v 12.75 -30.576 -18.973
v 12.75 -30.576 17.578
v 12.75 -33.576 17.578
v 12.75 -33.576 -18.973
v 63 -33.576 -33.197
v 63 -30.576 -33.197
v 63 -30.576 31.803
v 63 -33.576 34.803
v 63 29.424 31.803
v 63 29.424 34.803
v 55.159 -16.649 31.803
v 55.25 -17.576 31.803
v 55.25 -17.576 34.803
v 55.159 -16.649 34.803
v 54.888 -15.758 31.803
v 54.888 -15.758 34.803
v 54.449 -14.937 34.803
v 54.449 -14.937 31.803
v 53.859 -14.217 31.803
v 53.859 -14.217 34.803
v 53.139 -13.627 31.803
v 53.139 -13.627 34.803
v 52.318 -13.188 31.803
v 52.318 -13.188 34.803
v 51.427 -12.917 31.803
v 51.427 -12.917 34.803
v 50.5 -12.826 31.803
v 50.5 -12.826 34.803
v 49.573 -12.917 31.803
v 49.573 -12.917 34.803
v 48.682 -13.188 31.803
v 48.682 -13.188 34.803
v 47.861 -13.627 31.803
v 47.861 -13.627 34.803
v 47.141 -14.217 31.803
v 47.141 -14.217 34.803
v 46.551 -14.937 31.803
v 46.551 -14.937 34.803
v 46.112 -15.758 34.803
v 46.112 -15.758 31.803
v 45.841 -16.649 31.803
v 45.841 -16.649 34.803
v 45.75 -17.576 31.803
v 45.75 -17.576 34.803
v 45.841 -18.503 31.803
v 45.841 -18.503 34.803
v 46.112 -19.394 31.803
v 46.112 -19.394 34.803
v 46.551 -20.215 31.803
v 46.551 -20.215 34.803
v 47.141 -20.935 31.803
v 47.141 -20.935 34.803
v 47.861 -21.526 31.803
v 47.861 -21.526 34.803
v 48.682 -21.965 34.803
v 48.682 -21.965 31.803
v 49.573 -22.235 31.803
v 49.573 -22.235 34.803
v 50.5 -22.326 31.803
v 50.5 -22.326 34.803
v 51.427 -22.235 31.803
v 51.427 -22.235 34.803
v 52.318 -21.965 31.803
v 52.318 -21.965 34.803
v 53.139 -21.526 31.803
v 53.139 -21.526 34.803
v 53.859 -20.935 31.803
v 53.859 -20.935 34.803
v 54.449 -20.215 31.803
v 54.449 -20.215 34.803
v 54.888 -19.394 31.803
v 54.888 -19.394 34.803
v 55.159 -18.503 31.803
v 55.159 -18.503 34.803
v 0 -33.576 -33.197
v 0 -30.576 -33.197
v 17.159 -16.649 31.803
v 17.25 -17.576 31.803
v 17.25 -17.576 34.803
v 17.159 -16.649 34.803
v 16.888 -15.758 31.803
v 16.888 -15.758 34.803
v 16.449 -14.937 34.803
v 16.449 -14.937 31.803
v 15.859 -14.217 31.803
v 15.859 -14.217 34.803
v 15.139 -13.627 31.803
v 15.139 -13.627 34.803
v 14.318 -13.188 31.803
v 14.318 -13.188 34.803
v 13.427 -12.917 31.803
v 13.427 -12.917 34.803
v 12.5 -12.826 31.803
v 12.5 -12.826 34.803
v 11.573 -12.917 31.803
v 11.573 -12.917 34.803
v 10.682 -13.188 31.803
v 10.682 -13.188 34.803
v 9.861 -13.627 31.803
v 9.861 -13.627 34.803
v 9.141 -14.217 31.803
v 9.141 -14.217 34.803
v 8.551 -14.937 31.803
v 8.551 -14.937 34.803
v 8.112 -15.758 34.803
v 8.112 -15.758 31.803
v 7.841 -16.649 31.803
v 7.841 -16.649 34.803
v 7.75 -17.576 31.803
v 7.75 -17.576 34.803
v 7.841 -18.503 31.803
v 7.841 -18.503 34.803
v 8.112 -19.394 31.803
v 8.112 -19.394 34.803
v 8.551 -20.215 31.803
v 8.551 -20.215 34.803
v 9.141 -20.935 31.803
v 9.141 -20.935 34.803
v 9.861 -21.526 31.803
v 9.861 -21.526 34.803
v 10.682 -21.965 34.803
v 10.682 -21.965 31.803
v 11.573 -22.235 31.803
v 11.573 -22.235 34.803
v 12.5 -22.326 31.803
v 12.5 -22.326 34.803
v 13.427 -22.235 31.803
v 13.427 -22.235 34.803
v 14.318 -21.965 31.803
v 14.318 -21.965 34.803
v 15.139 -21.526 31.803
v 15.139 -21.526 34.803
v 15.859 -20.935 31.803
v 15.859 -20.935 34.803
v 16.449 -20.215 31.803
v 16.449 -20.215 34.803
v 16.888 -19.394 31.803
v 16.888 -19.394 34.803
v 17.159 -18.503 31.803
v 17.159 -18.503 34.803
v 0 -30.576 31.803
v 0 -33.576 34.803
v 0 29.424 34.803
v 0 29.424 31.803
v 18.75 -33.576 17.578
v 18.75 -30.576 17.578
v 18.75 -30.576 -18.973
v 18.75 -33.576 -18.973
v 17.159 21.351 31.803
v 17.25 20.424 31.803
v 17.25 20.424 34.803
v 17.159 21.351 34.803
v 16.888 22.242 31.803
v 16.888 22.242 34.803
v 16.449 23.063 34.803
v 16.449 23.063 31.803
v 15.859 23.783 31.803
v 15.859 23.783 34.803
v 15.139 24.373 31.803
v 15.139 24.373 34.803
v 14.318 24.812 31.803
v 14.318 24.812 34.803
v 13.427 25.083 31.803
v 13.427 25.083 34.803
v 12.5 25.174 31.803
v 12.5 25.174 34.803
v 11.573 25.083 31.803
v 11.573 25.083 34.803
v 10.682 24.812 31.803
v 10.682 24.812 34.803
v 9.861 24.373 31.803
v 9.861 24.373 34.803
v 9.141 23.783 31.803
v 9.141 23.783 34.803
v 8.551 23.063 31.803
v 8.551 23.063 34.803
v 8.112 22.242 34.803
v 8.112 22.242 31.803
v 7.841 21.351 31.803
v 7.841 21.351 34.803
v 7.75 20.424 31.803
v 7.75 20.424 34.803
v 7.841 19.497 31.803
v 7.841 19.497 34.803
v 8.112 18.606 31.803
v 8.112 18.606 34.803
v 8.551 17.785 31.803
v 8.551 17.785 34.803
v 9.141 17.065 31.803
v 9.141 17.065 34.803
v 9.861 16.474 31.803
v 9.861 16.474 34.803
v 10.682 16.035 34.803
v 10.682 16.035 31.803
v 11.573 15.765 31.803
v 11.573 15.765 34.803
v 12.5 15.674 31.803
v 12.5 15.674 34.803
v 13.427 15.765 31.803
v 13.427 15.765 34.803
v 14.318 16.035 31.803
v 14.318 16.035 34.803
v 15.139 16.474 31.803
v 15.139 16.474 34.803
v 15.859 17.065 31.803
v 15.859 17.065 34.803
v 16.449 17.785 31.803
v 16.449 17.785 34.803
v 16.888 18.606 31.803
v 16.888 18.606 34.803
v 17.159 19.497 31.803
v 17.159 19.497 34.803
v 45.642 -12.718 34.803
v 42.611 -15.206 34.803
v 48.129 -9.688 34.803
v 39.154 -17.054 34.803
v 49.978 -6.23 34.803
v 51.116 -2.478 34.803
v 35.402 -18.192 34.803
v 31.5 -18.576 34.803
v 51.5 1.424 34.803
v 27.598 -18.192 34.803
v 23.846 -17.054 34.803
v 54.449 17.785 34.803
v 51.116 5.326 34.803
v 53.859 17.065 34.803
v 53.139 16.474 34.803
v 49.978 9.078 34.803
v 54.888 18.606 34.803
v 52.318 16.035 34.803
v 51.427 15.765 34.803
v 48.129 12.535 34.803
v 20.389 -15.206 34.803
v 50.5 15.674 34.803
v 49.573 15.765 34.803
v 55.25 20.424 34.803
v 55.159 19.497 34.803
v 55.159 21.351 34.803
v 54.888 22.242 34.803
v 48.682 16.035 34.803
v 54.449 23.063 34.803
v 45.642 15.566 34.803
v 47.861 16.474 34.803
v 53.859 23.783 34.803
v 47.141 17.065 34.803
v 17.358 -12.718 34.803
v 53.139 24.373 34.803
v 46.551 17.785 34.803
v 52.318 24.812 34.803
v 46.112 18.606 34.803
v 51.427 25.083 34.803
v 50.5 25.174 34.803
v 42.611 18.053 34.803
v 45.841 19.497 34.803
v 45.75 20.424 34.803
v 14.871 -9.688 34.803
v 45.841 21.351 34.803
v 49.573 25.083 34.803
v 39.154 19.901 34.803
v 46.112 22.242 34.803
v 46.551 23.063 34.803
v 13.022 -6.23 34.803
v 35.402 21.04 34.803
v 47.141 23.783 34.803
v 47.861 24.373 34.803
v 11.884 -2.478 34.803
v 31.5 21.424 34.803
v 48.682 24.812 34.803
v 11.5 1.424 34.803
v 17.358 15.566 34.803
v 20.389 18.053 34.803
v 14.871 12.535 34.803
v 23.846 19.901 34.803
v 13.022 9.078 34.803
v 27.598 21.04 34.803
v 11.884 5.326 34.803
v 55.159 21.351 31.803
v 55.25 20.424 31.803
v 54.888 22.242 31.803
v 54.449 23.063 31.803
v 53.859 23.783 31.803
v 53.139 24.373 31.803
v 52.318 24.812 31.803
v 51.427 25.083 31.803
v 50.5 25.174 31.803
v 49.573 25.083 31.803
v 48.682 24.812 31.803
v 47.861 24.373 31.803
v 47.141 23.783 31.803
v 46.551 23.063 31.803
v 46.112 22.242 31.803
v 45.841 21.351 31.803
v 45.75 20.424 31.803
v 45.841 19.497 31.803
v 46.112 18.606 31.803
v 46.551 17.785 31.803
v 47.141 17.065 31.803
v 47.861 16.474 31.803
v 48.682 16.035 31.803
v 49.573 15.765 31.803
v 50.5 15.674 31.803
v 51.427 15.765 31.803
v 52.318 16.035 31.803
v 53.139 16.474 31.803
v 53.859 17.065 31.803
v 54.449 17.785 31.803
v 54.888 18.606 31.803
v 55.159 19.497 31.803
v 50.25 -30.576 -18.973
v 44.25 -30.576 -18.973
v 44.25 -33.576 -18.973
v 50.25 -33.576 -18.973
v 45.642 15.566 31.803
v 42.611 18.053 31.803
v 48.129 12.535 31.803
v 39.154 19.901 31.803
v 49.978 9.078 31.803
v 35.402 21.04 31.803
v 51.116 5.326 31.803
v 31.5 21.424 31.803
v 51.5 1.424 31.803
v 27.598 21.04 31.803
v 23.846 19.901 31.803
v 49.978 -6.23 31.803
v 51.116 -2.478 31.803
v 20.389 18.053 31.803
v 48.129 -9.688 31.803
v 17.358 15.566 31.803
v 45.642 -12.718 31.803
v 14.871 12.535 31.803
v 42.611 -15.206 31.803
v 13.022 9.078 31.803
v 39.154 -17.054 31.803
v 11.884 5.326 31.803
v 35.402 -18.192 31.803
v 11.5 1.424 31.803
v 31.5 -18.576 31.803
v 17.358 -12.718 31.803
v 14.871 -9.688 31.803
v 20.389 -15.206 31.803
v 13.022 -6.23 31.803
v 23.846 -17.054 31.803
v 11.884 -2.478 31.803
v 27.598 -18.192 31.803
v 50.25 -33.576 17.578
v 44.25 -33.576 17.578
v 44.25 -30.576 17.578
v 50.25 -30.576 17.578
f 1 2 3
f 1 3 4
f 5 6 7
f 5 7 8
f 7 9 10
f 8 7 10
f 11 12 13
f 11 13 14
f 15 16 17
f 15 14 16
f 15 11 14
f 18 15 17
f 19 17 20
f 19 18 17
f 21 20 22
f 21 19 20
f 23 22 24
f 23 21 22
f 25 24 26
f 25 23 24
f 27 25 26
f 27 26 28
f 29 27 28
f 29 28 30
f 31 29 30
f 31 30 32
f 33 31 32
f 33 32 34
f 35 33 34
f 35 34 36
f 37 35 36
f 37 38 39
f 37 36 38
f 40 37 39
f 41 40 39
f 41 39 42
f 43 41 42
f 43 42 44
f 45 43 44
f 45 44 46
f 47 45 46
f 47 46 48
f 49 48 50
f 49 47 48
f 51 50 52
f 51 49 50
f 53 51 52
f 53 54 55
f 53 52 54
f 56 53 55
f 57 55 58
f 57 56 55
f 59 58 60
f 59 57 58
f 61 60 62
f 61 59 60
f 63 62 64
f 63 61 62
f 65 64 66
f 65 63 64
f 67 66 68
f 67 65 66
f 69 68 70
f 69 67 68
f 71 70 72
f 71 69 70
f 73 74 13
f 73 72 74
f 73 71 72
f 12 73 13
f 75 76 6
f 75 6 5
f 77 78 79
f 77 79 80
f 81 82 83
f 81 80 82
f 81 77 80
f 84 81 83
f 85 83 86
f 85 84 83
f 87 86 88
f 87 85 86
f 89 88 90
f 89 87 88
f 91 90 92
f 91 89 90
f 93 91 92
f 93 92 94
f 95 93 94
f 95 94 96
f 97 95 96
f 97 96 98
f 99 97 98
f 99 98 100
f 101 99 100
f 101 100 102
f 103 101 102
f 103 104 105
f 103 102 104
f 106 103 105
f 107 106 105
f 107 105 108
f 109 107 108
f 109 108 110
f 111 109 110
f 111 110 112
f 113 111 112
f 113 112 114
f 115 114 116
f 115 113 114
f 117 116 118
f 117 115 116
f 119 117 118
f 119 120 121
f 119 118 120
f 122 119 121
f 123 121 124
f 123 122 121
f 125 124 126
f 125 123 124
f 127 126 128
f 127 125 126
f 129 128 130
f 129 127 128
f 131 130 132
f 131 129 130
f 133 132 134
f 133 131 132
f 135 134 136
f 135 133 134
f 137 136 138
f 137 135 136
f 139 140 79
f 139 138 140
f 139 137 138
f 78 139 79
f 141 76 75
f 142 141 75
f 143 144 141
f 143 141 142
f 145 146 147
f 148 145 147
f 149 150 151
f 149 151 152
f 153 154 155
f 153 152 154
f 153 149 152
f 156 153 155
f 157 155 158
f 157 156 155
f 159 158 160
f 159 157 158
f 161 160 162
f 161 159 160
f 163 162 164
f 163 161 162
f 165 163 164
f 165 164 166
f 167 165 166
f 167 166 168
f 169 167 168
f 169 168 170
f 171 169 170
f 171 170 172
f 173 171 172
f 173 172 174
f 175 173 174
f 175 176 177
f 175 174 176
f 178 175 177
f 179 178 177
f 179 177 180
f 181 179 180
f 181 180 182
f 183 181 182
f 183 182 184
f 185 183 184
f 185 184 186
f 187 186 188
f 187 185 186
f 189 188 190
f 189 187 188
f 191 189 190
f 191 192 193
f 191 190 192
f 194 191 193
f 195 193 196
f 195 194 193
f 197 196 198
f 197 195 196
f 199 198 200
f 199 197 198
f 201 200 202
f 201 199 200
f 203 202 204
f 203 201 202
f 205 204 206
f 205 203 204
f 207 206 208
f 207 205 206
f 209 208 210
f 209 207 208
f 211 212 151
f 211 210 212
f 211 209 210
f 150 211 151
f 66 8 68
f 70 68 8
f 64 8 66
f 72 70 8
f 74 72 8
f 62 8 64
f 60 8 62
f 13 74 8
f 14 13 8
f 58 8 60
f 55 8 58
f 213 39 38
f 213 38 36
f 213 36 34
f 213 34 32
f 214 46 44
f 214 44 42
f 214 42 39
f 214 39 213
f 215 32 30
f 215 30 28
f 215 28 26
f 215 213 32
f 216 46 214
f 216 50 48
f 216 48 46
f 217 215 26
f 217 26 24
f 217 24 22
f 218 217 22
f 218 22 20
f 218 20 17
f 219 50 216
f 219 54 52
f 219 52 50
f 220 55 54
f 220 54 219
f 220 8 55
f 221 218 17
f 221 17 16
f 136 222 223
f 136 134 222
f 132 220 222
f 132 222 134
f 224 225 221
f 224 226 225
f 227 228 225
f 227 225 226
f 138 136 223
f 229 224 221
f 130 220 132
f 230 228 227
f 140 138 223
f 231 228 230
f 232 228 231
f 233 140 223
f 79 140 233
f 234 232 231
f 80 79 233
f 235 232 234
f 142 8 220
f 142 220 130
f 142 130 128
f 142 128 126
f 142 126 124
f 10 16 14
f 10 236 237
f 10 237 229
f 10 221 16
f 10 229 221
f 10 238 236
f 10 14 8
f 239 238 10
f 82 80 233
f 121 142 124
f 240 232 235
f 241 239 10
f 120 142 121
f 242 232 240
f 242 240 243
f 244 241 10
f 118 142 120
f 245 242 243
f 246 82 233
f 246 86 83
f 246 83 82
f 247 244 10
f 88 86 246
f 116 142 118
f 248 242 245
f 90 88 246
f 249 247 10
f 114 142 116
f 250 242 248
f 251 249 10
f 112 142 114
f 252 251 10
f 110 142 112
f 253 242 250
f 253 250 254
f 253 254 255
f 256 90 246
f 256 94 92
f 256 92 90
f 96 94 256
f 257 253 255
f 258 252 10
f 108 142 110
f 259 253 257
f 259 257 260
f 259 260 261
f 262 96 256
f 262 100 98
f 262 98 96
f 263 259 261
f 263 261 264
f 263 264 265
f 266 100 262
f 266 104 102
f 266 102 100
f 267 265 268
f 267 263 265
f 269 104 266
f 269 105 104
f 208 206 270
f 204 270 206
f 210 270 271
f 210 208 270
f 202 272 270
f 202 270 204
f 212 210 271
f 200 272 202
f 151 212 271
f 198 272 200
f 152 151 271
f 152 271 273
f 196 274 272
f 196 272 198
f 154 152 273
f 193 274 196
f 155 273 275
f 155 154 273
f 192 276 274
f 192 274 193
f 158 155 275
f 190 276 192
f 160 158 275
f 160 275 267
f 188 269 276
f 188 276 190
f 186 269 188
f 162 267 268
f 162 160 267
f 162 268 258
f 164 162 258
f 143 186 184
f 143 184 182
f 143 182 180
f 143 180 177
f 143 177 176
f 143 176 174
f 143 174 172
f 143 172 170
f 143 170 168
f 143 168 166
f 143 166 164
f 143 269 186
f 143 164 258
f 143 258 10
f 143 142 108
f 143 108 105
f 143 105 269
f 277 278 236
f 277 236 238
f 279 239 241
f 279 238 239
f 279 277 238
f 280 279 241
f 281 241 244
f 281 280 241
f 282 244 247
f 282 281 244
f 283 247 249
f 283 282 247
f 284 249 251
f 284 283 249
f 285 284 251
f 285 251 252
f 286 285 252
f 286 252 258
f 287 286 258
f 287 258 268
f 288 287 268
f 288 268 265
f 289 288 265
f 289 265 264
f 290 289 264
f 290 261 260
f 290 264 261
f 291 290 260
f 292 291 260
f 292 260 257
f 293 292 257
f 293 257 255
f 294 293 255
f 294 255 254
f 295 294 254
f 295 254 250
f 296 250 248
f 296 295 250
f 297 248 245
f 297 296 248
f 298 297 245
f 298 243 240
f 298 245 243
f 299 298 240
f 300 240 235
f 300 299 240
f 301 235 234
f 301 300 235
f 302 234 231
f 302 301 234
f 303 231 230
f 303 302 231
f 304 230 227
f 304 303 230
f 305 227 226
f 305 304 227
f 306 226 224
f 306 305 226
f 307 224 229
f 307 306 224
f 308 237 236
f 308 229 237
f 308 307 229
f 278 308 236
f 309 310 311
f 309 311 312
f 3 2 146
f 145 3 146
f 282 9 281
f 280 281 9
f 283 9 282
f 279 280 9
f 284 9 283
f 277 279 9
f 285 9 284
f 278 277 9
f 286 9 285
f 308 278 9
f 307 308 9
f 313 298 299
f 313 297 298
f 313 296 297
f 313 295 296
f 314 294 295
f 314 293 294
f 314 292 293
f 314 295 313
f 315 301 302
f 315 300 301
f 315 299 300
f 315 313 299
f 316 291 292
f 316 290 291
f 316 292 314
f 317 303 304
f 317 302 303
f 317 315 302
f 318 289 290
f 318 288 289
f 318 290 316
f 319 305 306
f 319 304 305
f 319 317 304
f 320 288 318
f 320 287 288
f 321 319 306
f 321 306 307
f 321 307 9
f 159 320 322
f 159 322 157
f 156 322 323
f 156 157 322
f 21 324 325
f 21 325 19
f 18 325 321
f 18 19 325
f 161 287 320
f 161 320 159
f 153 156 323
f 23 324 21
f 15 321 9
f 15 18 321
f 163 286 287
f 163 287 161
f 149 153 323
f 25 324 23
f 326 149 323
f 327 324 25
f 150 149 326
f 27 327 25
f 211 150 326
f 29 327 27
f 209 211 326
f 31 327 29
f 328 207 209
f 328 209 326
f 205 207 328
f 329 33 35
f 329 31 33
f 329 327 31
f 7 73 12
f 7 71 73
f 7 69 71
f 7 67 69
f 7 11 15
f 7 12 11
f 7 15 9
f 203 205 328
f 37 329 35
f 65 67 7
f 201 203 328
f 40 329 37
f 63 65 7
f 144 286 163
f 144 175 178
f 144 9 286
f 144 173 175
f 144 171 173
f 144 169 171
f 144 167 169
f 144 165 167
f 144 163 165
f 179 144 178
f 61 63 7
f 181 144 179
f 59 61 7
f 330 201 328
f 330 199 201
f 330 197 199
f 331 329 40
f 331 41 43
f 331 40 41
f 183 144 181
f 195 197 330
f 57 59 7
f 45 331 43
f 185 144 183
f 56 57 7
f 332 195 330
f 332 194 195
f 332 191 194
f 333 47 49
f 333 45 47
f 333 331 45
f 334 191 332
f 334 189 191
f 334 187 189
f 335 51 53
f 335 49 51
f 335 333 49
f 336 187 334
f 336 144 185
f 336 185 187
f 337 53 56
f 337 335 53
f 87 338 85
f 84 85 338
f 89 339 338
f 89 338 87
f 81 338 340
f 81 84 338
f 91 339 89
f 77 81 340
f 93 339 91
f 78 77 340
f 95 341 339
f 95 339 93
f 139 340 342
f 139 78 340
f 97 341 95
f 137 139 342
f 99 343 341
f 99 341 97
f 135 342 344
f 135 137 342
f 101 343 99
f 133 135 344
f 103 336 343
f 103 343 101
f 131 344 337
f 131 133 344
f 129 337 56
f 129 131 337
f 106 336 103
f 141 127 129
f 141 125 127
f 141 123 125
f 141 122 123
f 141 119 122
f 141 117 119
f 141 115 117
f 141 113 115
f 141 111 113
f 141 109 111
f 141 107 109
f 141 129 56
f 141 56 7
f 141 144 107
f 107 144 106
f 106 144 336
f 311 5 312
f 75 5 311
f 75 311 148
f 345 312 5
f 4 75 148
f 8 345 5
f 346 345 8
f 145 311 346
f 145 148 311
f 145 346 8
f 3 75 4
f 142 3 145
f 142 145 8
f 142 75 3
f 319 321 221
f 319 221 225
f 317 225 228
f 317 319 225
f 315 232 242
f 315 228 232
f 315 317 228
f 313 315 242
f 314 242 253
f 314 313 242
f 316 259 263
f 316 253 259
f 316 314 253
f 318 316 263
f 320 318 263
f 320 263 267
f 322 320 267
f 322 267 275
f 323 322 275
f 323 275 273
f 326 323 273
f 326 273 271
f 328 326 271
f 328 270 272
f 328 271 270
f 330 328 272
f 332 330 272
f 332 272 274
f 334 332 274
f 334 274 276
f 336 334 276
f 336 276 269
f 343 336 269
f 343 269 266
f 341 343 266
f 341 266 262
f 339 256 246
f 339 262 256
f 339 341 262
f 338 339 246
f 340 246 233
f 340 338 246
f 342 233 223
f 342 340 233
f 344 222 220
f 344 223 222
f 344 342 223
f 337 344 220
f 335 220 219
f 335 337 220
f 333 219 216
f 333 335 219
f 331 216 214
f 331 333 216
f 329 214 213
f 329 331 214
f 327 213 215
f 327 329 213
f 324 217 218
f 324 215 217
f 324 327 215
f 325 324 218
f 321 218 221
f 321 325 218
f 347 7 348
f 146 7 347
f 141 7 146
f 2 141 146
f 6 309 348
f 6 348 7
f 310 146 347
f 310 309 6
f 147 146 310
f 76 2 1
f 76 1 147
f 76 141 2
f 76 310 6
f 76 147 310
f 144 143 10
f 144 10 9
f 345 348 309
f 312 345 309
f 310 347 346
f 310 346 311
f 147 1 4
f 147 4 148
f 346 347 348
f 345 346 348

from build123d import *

# Parameters (mm, degrees)
BOSS_EXTRUDE1_DEPTH     = 63
SKETCH2_R               = 4.75
SKETCH2_R_2             = 20
CUT_EXTRUDE1_DEPTH      = 35.80267333
CUT_EXTRUDE1_DEPTH_BACK = 34.19732667
SKETCH3_W               = 6
SKETCH3_H               = 36.550616257
CUT_EXTRUDE2_DEPTH      = 4


with BuildPart() as part:
    # Sketch1 → Boss-Extrude1 (new body)
    with BuildSketch(Plane(origin=(0, 0, 0), x_dir=(0, 0, -1), z_dir=(1, 0, 0))):
        Polygon((-31.80267333, 29.42384106), (-31.80267333, -30.57615894), (33.19732667, -30.57615894), (33.19732667, -33.57615894), (-34.80267333, -33.57615894), (-34.80267333, 29.42384106), align=None)
    extrude(amount=BOSS_EXTRUDE1_DEPTH)

    # Sketch2 → Cut-Extrude1 (cut, two sides)
    with BuildSketch(Plane.XY) as cut_extrude1_sk:
        with Locations((50.5, -17.57615894)):
            Circle(SKETCH2_R)
        with Locations((50.5, 20.42384106)):
            Circle(SKETCH2_R)
        with Locations((12.5, -17.57615894)):
            Circle(SKETCH2_R)
        with Locations((12.5, 20.42384106)):
            Circle(SKETCH2_R)
        with Locations((31.5, 1.42384106)):
            Circle(SKETCH2_R_2)
    extrude(amount=CUT_EXTRUDE1_DEPTH, mode=Mode.SUBTRACT)
    extrude(cut_extrude1_sk.sketch, amount=-CUT_EXTRUDE1_DEPTH_BACK, mode=Mode.SUBTRACT)

    # Sketch3 → Cut-Extrude2 (cut, through all)
    with BuildSketch(Plane(origin=(0, -30.57615894, 0), x_dir=(1, 0, 0), z_dir=(0, 1, 0))):
        with Locations((15.75, 0.697326671)):
            Rectangle(SKETCH3_W, SKETCH3_H)
        with Locations((47.25, 0.697326671)):
            Rectangle(SKETCH3_W, SKETCH3_H)
    extrude(amount=-CUT_EXTRUDE2_DEPTH, mode=Mode.SUBTRACT)


solid = part.part
